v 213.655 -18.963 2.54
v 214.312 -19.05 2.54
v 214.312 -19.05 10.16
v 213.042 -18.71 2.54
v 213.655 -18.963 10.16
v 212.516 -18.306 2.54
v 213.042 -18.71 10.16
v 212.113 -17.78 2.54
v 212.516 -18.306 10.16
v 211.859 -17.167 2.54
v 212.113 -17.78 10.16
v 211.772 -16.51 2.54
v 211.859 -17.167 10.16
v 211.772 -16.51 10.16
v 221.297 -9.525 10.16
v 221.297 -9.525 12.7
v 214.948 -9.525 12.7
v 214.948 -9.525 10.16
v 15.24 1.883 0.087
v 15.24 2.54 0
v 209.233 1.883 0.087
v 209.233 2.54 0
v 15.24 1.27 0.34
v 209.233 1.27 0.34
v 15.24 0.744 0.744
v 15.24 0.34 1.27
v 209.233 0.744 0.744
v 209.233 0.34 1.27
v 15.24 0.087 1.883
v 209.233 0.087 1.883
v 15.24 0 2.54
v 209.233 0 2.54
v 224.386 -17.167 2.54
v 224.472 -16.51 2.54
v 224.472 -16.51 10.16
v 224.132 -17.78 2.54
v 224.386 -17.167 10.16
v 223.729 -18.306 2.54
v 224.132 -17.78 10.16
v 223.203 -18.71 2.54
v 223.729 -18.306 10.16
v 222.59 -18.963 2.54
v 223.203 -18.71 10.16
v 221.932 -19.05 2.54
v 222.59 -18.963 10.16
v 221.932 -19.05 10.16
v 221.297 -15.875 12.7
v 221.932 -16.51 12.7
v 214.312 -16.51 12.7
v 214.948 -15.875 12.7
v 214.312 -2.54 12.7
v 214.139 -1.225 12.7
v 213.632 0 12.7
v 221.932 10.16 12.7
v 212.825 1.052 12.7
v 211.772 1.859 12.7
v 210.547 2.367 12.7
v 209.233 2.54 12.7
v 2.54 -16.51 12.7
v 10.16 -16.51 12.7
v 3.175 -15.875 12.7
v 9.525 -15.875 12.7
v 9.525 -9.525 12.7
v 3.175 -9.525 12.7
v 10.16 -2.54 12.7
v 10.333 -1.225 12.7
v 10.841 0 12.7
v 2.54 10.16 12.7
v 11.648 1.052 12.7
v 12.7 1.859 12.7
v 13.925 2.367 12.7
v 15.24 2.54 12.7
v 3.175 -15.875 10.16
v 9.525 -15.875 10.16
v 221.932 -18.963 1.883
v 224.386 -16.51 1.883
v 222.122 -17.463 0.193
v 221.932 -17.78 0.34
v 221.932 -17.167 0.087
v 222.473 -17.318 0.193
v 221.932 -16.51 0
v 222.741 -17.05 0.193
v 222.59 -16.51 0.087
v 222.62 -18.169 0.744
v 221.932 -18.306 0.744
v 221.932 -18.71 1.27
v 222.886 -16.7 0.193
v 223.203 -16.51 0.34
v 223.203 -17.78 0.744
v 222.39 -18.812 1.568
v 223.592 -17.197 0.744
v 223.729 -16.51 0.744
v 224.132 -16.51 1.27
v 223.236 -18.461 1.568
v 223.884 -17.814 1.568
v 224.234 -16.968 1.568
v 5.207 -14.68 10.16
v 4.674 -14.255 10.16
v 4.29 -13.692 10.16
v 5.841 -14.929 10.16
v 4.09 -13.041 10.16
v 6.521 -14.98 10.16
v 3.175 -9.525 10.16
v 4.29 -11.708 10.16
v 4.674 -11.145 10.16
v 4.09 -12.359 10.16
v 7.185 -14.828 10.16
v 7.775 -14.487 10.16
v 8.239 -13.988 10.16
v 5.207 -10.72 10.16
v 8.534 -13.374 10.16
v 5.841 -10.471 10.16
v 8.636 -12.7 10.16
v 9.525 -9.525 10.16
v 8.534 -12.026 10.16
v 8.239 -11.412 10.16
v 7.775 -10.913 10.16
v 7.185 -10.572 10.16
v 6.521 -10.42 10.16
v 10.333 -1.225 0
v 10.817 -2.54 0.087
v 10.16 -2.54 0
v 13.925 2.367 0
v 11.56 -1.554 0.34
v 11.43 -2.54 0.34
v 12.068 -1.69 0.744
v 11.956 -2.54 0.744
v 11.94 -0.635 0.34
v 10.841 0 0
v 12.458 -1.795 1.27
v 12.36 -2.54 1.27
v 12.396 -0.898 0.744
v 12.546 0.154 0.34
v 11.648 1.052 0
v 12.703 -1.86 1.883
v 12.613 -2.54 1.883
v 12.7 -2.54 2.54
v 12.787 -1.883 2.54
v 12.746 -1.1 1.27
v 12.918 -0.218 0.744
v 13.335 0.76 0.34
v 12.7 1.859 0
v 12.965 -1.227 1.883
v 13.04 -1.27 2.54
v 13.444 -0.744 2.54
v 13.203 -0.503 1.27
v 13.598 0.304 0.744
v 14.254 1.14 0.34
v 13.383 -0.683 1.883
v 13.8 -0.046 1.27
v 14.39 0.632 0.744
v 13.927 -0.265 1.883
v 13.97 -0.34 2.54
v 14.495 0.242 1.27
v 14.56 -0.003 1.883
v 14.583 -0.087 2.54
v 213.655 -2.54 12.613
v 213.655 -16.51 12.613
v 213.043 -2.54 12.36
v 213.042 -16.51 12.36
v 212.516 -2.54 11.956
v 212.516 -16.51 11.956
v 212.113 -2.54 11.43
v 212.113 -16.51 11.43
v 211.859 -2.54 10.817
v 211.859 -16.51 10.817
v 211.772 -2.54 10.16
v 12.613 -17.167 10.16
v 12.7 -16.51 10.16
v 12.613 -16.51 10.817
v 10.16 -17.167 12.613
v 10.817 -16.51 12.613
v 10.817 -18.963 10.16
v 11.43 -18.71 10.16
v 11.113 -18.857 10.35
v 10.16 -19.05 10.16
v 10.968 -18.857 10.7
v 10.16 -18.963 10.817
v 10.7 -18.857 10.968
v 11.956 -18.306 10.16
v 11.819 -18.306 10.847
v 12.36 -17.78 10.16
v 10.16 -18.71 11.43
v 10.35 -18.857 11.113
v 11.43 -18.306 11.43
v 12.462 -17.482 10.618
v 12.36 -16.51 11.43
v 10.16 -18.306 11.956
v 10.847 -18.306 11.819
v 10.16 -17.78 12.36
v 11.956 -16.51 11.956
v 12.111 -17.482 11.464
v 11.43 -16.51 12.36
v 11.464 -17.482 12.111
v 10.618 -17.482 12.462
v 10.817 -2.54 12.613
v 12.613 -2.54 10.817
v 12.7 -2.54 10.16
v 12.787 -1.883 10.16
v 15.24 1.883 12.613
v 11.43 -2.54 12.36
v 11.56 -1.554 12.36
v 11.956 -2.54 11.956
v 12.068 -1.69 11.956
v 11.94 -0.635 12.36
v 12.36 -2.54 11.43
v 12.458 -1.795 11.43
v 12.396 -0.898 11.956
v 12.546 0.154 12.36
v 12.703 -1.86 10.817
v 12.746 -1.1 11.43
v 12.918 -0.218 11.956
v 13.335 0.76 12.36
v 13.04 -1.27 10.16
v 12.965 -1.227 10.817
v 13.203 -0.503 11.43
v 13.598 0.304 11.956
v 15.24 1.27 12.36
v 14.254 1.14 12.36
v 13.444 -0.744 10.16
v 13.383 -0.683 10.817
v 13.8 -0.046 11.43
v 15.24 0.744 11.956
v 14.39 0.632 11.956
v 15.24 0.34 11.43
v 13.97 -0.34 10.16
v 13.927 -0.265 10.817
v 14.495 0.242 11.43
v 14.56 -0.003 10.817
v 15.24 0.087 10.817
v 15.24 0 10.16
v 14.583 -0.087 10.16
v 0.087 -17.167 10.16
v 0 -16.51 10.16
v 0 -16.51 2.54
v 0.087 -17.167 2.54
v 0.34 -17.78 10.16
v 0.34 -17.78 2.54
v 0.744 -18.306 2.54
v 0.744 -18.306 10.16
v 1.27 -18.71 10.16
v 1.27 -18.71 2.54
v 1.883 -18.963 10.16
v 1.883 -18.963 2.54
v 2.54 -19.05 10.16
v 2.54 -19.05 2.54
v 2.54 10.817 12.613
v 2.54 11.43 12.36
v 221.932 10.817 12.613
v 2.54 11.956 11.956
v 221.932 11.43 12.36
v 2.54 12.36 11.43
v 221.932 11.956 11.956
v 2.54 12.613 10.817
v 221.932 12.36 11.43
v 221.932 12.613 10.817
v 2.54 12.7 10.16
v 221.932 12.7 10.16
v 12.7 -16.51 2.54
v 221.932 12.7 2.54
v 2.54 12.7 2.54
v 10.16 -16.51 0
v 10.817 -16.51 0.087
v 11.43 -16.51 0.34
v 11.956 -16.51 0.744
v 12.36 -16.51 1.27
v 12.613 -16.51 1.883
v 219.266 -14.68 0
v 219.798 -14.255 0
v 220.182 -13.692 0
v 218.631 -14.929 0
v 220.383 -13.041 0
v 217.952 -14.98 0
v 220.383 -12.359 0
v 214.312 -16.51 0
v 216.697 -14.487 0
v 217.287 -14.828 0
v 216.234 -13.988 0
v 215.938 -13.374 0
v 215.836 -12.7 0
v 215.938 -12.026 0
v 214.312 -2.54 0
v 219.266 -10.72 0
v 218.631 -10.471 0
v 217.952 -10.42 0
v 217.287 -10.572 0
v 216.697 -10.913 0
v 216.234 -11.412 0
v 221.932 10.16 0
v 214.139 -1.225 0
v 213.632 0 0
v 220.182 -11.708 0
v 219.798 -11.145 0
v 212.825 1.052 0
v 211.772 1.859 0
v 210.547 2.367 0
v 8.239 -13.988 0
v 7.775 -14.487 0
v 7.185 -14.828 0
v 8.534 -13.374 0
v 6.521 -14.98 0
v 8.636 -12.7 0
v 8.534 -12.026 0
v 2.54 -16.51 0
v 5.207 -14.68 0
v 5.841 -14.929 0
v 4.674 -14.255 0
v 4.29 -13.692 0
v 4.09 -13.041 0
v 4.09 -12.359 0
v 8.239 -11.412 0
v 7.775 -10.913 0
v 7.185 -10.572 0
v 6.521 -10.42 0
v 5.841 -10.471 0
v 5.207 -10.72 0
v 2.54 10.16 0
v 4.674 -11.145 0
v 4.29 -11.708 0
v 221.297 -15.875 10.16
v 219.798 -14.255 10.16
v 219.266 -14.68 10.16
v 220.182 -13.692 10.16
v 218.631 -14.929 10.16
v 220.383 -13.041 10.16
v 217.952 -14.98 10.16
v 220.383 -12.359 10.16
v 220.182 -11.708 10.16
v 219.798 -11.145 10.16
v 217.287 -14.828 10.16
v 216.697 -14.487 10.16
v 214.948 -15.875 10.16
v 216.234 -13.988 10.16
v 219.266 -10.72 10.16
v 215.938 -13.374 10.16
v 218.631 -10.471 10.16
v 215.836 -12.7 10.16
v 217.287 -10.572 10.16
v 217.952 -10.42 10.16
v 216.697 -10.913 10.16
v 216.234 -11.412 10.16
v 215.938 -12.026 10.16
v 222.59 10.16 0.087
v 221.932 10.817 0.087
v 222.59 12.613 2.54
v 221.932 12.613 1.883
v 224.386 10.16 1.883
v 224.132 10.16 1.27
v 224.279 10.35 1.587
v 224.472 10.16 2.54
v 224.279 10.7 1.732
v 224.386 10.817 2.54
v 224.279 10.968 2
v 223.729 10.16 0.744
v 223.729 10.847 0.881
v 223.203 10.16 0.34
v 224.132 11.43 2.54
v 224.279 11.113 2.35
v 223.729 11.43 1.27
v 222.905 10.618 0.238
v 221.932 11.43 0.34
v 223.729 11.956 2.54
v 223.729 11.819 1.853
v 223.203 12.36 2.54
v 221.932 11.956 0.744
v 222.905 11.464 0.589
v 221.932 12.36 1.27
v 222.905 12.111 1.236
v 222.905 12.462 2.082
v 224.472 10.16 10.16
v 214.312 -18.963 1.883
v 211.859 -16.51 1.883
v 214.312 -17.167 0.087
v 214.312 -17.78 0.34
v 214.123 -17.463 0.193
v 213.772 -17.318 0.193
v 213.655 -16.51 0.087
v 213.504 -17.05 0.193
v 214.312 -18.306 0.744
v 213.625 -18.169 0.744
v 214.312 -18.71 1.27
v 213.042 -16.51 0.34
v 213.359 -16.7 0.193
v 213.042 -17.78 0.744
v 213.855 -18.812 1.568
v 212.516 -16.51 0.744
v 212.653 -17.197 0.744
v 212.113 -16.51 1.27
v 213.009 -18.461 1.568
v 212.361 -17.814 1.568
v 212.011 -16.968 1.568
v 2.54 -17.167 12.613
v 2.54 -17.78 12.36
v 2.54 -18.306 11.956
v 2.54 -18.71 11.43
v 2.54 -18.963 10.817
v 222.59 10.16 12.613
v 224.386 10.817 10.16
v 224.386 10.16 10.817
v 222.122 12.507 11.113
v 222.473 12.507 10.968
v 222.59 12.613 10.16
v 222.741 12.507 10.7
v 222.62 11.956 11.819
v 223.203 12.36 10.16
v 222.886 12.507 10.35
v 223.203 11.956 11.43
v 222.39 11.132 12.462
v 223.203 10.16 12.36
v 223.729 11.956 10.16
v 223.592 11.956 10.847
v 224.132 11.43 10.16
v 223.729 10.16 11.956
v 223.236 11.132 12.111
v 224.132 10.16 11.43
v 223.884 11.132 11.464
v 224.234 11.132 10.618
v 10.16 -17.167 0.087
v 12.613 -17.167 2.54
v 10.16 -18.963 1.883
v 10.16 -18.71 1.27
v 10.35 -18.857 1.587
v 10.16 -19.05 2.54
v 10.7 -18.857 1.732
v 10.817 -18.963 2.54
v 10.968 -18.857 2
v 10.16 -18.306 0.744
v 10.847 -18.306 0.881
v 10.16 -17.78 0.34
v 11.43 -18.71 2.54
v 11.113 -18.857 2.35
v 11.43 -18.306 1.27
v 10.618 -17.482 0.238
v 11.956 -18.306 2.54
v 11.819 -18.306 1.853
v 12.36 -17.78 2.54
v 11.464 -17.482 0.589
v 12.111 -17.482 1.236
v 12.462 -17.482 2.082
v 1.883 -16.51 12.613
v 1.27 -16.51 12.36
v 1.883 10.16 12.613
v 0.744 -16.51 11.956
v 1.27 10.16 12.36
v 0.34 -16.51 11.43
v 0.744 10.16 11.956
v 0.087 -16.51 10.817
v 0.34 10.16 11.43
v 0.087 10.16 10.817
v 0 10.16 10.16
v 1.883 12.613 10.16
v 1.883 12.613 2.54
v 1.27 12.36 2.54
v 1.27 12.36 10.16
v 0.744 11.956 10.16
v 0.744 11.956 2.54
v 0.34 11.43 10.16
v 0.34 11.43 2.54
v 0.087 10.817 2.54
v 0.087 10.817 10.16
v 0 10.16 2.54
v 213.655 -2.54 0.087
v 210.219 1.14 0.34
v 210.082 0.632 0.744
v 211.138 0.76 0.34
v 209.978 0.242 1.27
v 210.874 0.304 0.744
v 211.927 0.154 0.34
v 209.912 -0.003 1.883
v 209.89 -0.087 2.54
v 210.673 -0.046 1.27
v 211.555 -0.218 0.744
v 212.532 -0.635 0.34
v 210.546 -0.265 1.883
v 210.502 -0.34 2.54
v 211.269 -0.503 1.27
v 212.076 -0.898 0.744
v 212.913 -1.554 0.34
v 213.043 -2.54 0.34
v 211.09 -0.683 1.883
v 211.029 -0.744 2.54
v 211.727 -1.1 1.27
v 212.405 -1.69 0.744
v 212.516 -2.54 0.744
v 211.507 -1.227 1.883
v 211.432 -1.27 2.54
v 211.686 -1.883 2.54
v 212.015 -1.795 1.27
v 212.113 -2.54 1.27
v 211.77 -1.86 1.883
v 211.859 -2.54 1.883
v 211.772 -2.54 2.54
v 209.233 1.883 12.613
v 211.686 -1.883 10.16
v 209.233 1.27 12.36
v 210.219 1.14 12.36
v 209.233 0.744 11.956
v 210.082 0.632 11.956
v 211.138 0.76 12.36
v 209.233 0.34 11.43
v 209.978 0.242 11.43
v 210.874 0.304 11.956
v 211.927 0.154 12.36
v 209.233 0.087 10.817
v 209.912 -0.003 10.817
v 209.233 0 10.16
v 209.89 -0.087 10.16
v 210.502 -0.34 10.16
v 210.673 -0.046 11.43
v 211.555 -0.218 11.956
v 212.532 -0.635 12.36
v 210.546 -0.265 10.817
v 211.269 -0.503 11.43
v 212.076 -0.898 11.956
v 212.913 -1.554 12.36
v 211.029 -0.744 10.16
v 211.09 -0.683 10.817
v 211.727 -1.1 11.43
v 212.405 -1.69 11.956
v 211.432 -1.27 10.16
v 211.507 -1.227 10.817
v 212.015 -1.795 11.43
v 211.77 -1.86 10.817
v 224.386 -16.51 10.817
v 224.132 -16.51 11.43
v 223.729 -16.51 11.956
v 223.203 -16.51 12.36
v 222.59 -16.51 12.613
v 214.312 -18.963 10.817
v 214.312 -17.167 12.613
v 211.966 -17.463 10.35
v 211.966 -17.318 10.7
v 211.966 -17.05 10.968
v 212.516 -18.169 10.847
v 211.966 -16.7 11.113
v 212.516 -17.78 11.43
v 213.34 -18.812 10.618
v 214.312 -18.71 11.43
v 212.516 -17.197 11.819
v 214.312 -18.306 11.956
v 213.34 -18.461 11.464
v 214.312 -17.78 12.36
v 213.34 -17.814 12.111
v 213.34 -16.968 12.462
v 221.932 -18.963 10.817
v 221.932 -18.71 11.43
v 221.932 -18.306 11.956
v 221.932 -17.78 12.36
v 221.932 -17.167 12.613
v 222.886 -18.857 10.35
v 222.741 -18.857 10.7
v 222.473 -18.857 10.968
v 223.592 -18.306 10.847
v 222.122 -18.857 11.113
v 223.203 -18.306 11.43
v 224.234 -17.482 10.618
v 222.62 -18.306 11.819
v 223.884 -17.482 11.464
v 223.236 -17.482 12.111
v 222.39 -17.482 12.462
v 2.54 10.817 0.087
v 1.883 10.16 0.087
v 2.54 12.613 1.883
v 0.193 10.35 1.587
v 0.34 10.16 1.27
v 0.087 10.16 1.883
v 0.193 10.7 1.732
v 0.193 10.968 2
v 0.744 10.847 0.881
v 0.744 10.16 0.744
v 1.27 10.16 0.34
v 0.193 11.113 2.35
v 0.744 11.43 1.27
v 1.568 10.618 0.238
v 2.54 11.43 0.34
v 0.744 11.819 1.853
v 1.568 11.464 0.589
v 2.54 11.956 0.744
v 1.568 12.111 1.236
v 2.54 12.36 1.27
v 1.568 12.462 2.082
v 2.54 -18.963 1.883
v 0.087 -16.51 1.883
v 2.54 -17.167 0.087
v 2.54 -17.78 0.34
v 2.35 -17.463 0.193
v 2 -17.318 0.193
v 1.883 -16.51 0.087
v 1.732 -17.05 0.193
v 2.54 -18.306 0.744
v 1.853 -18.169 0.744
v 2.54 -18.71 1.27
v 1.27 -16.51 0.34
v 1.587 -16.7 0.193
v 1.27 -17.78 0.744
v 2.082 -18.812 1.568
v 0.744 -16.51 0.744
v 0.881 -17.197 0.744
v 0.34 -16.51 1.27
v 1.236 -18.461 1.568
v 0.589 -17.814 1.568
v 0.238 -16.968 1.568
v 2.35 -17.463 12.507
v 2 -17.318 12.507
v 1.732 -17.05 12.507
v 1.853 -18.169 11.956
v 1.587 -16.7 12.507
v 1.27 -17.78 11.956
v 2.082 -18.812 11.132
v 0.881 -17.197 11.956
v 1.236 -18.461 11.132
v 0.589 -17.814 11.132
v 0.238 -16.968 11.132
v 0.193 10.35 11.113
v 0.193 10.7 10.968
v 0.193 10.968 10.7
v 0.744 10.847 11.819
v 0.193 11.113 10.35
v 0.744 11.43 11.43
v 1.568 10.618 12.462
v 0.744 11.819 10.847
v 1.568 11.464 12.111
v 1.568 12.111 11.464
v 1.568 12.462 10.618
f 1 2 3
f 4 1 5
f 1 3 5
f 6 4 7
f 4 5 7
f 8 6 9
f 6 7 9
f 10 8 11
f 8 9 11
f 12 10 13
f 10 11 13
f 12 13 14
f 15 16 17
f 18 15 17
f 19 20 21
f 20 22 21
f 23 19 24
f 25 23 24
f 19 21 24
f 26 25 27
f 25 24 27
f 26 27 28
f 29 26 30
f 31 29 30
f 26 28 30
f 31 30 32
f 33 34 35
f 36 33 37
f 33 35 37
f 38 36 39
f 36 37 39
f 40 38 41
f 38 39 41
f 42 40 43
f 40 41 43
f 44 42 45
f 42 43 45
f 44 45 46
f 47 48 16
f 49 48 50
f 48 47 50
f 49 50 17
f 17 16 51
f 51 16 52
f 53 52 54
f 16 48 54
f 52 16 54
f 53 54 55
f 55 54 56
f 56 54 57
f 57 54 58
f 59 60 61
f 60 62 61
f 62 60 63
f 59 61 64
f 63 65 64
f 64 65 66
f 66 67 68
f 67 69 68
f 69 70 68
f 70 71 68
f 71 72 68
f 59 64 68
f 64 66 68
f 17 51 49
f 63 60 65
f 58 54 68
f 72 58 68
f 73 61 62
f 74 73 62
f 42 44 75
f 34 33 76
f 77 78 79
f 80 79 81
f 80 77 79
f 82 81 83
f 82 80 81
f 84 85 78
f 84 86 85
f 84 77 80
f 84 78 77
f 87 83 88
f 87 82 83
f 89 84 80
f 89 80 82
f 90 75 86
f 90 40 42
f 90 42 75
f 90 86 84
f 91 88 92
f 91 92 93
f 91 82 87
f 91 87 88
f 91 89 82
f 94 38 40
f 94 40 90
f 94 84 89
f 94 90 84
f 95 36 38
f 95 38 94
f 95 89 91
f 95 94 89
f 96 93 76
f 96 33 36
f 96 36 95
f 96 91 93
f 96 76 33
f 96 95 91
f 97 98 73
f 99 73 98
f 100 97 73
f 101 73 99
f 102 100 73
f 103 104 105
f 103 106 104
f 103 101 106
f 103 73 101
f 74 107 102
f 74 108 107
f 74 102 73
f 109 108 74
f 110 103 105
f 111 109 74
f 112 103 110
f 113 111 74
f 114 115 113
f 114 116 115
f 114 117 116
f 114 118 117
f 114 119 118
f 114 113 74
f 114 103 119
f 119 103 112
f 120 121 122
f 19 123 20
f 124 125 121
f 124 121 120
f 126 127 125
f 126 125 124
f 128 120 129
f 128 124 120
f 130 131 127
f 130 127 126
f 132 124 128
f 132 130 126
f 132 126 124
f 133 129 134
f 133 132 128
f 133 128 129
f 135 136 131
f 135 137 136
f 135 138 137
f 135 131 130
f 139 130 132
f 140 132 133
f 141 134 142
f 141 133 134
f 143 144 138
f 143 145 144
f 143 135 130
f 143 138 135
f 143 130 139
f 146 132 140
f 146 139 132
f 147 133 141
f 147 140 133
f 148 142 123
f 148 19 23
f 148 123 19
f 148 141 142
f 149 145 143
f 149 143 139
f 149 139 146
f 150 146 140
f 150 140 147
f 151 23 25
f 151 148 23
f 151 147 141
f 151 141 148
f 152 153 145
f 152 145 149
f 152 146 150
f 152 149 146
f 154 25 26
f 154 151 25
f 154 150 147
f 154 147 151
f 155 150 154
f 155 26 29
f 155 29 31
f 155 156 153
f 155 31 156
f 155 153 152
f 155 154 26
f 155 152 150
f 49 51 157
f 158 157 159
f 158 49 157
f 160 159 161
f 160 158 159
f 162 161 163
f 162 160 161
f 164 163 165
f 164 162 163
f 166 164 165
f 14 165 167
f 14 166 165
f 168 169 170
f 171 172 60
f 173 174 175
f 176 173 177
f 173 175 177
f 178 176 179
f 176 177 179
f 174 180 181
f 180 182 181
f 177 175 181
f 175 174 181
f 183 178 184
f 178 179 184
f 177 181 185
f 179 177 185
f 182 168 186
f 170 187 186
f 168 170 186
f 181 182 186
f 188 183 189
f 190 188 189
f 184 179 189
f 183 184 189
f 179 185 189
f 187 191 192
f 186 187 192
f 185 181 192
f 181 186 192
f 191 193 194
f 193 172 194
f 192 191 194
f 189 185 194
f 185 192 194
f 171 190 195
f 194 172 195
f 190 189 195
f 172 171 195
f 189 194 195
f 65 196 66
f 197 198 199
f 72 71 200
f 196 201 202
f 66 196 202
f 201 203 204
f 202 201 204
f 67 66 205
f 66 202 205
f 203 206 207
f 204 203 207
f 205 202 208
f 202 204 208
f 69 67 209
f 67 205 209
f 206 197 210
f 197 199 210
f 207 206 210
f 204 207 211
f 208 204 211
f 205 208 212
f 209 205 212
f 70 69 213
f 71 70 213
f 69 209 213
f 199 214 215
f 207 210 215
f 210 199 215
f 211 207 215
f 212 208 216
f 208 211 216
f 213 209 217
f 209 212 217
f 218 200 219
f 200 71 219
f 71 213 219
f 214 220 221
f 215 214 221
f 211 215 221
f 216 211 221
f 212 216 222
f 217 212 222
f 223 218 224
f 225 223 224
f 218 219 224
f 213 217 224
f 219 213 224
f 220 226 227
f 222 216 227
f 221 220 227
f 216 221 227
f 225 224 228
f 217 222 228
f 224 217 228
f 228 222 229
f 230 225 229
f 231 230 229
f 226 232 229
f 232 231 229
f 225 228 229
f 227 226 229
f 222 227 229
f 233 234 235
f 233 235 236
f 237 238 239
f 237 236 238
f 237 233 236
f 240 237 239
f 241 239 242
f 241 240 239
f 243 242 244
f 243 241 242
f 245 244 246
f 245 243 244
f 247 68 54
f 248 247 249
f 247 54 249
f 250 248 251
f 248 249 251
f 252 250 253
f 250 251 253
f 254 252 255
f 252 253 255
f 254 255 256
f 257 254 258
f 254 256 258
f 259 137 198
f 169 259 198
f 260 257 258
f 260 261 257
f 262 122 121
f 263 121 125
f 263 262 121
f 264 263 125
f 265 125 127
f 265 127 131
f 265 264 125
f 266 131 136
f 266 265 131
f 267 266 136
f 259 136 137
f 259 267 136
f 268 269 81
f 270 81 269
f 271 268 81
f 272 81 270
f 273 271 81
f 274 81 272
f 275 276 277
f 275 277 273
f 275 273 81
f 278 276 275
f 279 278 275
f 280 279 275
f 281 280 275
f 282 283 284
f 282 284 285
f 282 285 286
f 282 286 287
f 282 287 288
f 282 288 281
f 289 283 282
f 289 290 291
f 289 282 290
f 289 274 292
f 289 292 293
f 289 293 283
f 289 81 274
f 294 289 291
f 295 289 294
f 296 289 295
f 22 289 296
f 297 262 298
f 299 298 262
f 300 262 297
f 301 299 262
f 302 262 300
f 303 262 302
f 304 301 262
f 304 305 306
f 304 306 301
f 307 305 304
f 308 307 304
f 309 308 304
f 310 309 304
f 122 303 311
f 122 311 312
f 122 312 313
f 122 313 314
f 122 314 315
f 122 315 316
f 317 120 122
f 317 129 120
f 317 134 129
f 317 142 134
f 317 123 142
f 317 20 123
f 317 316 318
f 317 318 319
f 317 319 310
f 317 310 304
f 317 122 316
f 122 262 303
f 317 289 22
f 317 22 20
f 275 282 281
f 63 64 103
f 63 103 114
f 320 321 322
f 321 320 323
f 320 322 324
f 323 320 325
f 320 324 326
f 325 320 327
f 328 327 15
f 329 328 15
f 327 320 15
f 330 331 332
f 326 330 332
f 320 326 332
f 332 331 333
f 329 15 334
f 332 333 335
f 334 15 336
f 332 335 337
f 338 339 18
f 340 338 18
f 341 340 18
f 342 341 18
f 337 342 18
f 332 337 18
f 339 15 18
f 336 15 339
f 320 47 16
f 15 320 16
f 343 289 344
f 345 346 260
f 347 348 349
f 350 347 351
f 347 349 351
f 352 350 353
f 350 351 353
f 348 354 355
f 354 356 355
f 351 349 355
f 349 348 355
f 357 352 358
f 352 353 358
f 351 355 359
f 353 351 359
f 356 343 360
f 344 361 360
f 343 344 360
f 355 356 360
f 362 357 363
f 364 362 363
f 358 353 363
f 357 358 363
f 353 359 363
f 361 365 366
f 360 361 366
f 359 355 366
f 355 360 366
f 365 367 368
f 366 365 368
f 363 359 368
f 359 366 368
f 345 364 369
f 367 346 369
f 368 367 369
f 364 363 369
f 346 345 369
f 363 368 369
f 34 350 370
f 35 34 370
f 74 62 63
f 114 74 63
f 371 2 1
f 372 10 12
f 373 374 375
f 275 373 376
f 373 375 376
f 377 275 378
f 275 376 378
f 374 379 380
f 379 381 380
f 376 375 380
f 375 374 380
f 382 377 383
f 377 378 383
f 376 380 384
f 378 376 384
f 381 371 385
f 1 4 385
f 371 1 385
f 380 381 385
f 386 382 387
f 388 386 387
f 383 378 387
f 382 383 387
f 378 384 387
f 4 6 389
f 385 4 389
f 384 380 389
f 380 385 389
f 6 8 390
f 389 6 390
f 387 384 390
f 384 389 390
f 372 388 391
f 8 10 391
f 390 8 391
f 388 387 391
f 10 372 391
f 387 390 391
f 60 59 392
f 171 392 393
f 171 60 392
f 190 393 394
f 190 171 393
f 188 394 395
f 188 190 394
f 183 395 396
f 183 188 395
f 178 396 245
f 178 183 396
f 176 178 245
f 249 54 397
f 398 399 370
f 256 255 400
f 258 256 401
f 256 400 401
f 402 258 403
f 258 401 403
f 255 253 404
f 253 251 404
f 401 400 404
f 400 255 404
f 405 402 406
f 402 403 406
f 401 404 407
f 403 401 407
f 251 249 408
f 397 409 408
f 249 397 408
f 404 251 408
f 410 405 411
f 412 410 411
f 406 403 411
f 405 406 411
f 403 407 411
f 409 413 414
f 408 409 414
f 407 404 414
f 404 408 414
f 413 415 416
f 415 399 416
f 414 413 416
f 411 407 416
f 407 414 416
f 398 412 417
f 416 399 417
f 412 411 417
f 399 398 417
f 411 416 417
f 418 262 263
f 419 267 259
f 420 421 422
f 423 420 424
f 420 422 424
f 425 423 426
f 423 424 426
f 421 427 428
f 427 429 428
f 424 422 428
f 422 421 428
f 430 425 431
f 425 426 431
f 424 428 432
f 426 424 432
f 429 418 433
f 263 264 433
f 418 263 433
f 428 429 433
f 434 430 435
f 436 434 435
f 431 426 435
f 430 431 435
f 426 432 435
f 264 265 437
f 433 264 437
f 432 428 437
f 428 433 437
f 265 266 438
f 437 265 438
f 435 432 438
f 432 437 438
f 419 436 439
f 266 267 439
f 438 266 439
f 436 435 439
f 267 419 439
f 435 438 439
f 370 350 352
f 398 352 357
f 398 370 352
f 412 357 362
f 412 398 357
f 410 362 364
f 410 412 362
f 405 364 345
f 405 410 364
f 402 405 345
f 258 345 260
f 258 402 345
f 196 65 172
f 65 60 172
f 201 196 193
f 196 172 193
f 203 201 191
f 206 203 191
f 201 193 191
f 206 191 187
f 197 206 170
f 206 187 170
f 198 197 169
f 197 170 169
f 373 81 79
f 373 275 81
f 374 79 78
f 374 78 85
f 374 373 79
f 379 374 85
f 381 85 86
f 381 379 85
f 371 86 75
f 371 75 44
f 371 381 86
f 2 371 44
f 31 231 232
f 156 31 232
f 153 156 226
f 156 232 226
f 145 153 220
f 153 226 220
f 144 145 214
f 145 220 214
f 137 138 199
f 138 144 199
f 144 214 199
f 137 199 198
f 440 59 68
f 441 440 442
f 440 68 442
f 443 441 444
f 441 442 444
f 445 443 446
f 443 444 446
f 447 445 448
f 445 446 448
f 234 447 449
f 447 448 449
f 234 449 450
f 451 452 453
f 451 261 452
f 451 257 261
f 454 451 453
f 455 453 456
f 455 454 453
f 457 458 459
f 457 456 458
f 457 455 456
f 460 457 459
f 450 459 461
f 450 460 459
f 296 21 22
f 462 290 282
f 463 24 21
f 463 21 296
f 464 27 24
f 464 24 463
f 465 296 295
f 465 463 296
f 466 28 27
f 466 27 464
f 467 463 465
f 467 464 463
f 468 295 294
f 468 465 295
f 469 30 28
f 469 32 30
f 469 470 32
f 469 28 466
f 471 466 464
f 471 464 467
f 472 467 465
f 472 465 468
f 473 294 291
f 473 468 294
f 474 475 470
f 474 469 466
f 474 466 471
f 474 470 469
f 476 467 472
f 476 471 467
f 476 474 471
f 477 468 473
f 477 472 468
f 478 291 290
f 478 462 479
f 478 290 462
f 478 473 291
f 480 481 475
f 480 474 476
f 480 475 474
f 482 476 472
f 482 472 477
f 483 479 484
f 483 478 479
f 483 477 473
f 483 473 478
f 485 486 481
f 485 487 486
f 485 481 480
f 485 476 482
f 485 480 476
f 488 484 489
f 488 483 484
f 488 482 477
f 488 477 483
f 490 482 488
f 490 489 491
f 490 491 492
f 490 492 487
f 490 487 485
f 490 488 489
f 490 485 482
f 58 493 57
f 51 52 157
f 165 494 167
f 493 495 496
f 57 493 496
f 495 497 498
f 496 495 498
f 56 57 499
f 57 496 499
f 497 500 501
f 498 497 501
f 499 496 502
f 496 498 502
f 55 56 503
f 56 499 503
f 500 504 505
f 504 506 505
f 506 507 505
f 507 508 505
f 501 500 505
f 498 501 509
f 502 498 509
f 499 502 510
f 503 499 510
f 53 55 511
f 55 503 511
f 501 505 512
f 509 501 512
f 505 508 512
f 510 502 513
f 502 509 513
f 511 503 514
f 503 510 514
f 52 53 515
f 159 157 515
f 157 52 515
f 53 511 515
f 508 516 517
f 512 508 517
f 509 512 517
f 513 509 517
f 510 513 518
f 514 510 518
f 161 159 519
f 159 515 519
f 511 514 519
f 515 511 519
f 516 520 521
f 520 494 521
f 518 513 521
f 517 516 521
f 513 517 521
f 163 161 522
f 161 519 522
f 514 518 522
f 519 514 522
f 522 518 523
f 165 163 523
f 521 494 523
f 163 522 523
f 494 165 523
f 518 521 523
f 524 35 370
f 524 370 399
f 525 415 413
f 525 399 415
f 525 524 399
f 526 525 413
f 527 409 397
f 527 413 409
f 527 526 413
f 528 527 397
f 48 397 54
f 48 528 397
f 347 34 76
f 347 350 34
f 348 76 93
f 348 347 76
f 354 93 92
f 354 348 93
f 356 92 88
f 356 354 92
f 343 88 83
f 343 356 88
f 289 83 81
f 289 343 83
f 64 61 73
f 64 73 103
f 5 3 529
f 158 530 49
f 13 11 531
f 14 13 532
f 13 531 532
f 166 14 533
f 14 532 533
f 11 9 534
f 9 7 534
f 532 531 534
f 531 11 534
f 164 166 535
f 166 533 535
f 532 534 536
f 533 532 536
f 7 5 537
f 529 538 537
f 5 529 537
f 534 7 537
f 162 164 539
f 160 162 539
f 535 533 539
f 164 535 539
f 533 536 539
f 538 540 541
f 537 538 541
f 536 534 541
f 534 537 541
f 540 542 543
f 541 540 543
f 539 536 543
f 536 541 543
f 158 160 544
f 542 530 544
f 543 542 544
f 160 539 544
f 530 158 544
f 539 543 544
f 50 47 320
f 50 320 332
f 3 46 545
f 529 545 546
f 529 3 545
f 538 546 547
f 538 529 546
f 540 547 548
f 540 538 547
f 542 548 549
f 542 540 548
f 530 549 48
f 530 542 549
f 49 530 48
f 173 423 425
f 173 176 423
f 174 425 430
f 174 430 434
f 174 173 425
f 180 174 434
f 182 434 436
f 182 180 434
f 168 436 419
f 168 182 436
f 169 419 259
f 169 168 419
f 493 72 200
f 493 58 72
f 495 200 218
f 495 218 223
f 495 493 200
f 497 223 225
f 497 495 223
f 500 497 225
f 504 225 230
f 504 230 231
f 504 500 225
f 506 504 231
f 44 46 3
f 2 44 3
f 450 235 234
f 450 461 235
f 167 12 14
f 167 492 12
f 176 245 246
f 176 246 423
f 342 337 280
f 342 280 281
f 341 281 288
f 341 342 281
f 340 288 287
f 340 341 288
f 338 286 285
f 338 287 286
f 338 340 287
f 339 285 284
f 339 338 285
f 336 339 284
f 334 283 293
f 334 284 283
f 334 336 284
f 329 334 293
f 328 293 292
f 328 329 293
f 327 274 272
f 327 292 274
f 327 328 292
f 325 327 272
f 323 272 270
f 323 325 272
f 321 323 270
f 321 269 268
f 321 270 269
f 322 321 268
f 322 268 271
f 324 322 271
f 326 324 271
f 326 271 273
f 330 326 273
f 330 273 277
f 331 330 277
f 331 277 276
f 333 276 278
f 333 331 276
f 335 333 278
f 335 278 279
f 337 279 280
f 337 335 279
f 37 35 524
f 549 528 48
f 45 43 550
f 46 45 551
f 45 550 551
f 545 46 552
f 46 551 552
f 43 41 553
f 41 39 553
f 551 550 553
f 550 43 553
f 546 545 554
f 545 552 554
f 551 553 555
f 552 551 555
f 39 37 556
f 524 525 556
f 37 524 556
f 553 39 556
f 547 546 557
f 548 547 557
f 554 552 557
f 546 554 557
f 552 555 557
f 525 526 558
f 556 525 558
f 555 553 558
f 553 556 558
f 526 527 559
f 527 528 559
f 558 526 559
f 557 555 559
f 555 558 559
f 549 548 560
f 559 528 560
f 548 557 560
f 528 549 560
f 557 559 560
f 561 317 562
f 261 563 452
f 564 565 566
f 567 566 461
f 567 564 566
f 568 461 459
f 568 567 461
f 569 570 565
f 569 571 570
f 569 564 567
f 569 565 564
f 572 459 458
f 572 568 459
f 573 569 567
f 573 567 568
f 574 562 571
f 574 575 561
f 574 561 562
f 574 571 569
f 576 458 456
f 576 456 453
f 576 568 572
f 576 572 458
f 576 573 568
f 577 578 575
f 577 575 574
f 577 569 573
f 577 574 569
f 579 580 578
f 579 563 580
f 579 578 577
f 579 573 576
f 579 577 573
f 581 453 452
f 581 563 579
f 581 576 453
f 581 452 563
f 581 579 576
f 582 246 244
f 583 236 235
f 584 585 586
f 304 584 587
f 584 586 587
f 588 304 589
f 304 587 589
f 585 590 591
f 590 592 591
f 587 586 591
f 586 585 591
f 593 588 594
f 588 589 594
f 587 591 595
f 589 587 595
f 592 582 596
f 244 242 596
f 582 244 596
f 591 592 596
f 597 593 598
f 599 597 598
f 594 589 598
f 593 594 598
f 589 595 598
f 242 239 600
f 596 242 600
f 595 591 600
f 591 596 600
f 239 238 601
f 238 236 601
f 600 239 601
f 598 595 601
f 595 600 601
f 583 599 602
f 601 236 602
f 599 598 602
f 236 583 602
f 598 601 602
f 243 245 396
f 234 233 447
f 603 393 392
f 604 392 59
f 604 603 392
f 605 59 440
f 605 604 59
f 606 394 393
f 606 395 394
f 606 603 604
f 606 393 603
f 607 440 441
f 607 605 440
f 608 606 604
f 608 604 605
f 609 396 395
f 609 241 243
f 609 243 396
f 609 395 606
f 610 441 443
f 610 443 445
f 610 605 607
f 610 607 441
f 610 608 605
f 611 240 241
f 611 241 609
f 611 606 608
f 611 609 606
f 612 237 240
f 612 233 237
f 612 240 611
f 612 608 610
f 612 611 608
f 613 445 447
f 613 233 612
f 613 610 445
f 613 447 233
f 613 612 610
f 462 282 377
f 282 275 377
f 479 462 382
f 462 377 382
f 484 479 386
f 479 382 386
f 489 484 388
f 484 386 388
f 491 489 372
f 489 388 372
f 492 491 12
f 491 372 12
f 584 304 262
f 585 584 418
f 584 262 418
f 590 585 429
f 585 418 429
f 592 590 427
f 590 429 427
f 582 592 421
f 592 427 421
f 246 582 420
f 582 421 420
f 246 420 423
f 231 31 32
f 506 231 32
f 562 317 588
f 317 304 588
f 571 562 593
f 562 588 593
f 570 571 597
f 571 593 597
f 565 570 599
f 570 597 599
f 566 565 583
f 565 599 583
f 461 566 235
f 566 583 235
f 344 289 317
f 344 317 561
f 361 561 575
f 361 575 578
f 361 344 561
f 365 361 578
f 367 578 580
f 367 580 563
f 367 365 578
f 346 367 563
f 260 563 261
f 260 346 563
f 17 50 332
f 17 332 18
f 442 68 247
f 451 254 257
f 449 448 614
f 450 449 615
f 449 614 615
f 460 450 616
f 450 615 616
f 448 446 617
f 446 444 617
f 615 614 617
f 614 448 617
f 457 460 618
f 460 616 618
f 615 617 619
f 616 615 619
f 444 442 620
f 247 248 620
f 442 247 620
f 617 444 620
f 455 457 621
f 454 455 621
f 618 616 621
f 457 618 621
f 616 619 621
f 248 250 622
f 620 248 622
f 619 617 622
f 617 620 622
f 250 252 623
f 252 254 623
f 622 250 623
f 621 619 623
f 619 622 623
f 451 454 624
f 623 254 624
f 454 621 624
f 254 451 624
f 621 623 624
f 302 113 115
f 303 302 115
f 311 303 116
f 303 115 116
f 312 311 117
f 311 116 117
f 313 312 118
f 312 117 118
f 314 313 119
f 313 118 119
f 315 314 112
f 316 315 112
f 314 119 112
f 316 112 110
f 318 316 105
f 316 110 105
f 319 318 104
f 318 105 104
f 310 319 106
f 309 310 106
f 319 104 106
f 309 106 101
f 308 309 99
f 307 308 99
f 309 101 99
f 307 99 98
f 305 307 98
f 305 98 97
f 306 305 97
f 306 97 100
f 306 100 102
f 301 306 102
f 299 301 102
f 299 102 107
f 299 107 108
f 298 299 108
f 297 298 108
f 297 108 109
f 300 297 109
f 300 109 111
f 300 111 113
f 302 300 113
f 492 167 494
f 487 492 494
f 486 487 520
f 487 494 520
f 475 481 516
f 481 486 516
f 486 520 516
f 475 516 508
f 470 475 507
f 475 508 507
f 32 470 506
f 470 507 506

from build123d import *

# Parameters (mm, degrees)
SKETCH1_W           = 224.4725
SKETCH1_H           = 12.7
BOSS_EXTRUDE1_DEPTH = 12.7
SKETCH2_W           = 12.7
SKETCH2_H           = 12.7
BOSS_EXTRUDE2_DEPTH = 19.05
SKETCH3_R           = 2.286
CUT_EXTRUDE1_DEPTH  = 226.63708861
SKETCH4_W           = 6.35
SKETCH4_H           = 6.35
CUT_EXTRUDE2_DEPTH  = 2.54
FILLET1_R           = 2.54


with BuildPart() as part:
    # Sketch1 → Boss-Extrude1 (new body)
    with BuildSketch(Plane.XY):
        with Locations((112.23625, 6.35)):
            Rectangle(SKETCH1_W, SKETCH1_H)
    extrude(amount=BOSS_EXTRUDE1_DEPTH)

    # Sketch2 → Boss-Extrude2 (add)
    with BuildSketch(Plane.XZ):
        with Locations((6.35, 6.35)):
            Rectangle(SKETCH2_W, SKETCH2_H)
    boss_extrude2 = extrude(amount=BOSS_EXTRUDE2_DEPTH)

    # Sketch3 → Cut-Extrude1 (cut, through all)
    with BuildSketch(Plane.XY.offset(12.7)):
        with Locations((6.35, -12.7)):
            Circle(SKETCH3_R)
    cut_extrude1 = extrude(amount=-CUT_EXTRUDE1_DEPTH, mode=Mode.SUBTRACT)

    # Sketch4 → Cut-Extrude2 (cut)
    with BuildSketch(Plane.XY.offset(12.7)):
        with Locations((6.35, -12.7)):
            Rectangle(SKETCH4_W, SKETCH4_H)
    cut_extrude2 = extrude(amount=-CUT_EXTRUDE2_DEPTH, mode=Mode.SUBTRACT)

    # Mirror1: Boss-Extrude2, Cut-Extrude1, Cut-Extrude2 across plane
    add(boss_extrude2.mirror(Plane.ZY.offset(-112.23625)))
    add(cut_extrude1.mirror(Plane.ZY.offset(-112.23625)), mode=Mode.SUBTRACT)
    add(cut_extrude2.mirror(Plane.ZY.offset(-112.23625)), mode=Mode.SUBTRACT)

    # Fillet1
    fillet1_edges = [part.edges().sort_by_distance(p)[0] for p in [
        (224.4725, -3.175, 12.7),
        (112.23625, 0, 0),
        (112.23625, 0, 12.7),
        (12.7, 0, 6.35),
        (112.23625, 12.7, 12.7),
        (12.7, -9.525, 0),
        (12.7, -9.525, 12.7),
        (0, -19.05, 6.35),
        (6.35, -19.05, 0),
        (12.7, -19.05, 6.35),
        (6.35, -19.05, 12.7),
        (0, -3.175, 12.7),
        (112.23625, 12.7, 0),
        (224.4725, -19.05, 6.35),
        (218.1225, -19.05, 12.7),
        (211.7725, -19.05, 6.35),
        (211.7725, -9.525, 12.7),
        (218.1225, -19.05, 0),
        (211.7725, -9.525, 0),
        (211.7725, 0, 6.35),
        (224.4725, -3.175, 0),
        (0, -3.175, 0),
        (0, 12.7, 6.35),
        (224.4725, 12.7, 6.35),
    ]]
    fillet(fillet1_edges, radius=FILLET1_R)


solid = part.part
